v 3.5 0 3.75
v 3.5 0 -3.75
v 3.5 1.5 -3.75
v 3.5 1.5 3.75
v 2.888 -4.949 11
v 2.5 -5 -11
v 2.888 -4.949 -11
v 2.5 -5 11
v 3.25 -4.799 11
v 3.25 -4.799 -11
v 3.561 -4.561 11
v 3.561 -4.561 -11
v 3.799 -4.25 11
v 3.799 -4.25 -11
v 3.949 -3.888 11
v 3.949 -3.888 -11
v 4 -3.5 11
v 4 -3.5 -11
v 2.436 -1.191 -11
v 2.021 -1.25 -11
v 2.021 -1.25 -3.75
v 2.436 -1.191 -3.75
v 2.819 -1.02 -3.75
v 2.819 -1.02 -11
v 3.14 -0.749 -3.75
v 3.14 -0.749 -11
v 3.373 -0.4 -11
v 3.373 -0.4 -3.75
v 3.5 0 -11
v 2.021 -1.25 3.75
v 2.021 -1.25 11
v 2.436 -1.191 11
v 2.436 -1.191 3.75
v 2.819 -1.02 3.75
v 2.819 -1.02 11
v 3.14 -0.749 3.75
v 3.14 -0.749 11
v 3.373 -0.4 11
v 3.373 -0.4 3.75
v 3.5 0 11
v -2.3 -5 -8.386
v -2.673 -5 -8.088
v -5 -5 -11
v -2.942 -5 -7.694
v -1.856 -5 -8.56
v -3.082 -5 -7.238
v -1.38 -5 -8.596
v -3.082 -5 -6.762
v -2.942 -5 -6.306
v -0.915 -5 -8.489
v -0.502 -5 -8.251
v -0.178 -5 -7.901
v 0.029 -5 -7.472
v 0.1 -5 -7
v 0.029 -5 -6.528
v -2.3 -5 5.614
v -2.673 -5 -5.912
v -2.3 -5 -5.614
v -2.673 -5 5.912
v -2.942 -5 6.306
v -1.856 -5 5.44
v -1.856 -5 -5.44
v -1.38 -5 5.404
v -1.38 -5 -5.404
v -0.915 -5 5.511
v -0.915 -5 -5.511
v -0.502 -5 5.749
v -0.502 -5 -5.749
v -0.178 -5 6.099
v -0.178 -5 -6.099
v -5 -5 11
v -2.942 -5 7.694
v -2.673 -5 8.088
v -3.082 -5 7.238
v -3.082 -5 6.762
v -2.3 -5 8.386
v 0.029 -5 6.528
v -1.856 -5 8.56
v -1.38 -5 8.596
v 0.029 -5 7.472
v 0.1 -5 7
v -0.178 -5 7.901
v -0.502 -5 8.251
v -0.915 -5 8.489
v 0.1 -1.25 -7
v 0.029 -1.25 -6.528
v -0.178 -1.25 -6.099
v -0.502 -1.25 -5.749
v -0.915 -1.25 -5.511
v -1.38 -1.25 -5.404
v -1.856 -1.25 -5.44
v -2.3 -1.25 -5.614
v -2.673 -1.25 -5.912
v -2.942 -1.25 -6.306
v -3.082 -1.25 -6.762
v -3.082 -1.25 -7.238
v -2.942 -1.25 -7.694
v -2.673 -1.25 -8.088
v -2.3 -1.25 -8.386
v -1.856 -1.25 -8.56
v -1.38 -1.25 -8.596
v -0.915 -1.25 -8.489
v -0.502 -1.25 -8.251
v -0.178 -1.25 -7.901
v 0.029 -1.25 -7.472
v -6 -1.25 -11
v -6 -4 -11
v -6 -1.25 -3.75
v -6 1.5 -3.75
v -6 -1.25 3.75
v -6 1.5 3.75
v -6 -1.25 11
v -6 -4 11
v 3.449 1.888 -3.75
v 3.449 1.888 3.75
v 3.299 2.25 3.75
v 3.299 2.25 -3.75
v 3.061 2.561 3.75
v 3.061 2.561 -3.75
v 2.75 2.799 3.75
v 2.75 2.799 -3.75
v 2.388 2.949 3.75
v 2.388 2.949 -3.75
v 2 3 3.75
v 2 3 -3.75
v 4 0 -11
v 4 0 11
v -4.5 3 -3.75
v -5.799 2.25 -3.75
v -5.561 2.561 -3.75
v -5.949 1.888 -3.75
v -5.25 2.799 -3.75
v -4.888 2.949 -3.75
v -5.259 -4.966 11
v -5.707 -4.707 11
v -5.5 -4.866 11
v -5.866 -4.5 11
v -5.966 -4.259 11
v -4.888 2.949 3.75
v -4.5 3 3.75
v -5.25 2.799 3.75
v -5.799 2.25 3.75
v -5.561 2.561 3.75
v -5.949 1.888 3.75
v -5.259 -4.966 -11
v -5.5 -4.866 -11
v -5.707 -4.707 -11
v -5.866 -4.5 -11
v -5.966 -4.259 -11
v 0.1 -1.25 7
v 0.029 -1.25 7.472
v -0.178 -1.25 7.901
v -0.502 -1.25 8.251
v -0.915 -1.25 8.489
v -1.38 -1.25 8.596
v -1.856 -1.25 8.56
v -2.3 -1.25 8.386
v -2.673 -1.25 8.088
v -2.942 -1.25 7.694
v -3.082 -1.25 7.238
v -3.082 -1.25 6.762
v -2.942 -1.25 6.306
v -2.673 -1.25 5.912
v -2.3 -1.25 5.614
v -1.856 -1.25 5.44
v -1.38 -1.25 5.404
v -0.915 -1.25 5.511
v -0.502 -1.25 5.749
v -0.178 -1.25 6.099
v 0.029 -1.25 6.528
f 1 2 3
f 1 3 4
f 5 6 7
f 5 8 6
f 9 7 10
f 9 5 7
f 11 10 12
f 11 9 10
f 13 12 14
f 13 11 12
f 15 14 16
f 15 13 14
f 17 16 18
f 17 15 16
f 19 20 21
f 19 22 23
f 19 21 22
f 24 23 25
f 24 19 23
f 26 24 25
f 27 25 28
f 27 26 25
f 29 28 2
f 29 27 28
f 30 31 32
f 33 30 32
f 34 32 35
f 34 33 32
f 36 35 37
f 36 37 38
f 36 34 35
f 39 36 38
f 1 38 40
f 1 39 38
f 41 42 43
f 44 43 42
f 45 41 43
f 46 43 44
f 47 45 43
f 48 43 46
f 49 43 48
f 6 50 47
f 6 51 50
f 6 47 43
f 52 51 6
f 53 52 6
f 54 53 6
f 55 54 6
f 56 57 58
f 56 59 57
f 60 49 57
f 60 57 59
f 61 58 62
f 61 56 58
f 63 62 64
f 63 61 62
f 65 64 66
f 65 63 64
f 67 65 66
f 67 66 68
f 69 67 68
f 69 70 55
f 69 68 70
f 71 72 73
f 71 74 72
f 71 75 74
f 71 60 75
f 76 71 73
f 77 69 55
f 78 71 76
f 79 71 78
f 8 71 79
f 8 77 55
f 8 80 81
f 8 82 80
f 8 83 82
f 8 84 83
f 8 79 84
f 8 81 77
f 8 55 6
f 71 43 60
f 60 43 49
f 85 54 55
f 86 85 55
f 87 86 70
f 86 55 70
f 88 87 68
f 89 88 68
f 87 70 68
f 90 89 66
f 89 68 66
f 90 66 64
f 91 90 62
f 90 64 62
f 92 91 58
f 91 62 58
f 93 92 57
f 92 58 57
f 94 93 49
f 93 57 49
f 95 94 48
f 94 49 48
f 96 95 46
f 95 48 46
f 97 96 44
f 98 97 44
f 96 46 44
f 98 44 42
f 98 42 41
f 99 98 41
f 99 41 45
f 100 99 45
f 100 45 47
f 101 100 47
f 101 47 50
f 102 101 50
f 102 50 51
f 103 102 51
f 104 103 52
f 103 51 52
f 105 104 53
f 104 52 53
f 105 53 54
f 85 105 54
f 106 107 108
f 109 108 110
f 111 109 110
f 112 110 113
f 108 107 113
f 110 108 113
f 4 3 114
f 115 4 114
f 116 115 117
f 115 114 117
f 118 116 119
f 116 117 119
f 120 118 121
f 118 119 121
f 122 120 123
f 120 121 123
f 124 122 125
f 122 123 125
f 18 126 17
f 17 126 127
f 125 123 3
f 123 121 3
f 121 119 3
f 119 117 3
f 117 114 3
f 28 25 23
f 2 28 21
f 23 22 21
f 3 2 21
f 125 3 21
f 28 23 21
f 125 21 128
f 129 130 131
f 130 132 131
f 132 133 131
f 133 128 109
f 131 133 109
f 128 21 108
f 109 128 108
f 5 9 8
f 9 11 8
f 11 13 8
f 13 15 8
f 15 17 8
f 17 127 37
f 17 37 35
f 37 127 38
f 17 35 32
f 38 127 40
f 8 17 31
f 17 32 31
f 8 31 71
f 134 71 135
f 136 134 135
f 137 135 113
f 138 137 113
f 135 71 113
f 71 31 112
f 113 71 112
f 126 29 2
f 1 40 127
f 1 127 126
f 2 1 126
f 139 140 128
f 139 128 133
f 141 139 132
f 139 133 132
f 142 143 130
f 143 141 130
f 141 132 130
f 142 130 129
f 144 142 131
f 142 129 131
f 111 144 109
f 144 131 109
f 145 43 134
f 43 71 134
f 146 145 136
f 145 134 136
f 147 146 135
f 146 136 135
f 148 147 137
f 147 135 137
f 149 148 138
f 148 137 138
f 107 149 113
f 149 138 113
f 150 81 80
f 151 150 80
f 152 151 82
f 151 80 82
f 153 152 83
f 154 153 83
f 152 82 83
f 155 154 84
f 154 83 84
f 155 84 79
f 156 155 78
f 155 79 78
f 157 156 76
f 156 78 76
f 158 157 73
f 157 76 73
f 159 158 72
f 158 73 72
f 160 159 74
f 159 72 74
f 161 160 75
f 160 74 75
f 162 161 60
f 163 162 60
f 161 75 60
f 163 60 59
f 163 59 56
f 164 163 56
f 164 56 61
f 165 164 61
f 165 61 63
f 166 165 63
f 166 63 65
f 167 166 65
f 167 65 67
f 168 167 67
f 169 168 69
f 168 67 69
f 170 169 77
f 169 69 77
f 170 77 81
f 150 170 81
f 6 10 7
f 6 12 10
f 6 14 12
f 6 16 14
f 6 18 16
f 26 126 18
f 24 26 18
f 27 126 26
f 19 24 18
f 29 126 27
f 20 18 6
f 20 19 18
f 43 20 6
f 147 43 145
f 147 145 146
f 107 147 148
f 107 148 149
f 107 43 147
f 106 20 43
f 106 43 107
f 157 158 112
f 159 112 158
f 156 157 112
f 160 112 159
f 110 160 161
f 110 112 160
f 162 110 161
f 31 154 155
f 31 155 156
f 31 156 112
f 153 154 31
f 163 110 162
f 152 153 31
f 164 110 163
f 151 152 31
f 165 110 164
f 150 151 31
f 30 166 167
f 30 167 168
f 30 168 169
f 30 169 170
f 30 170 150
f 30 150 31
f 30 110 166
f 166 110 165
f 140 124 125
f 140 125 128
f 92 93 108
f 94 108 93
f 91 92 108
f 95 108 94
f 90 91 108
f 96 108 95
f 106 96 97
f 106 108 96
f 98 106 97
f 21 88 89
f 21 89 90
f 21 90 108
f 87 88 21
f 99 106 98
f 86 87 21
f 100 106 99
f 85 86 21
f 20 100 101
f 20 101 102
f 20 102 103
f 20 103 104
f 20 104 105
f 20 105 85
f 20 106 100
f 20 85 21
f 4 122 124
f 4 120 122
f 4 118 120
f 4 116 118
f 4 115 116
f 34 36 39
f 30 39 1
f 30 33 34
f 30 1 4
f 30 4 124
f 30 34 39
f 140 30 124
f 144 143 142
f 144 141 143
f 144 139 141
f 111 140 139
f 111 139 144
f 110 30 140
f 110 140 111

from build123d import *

# Parameters (mm, degrees)
F0_W        = 10
F0_H        = 22
F1_DEPTH    = 5
F2_W        = 9.5
F2_H        = 1.25
F3_DEPTH    = 22
F4_R        = 1.5
F5_R        = 1.6
F6_DEPTH    = 3.75
F7_W        = 9.5
F7_H        = 7.5
F8_DEPTH    = 4.25
F9_T1_DEPTH = 10.9475498644
F9_T3_DEPTH = 10.9475498644
F9_T5_DEPTH = 15
F9_T7_DEPTH = 15
F10_R       = 1


# Not quite as in the source:
# - a fillet or chamfer that OpenCascade refuses, or shapes differently, is made with other operations: its cross-section is extruded or revolved along the edge and cut away or added


with BuildPart() as f1:
    # F0 (on Front) → F1 (new body)
    with BuildSketch(Plane.XZ):
        with Locations((-1, 0)):
            Rectangle(F0_W, F0_H)
    extrude(amount=F1_DEPTH)

    # F2 (on face) → F3 (cut, through all)
    with BuildSketch(Plane(origin=(0, 0, -11), x_dir=(1, 0, 0), z_dir=(0, 0, -1))):
        with Locations((-1.25, 0.625)):
            Rectangle(F2_W, F2_H)
    extrude(amount=-F3_DEPTH, mode=Mode.SUBTRACT)

    # F4
    f4_edges = [f1.edges().sort_by_distance(p)[0] for p in [
        (4, -5, 0),
    ]]
    fillet(f4_edges, radius=F4_R)

    # F5 (on face) → F6 (cut, through all)
    with BuildSketch(Plane.XZ.offset(5)):
        with Locations((-1.5, 7)):
            Circle(F5_R)
        with Locations((-1.5, -7)):
            Circle(F5_R)
    extrude(amount=-F6_DEPTH, mode=Mode.SUBTRACT)

    # F7 (on face) → F8 (join)
    with BuildSketch(Plane(origin=(0, -1.25, 0), x_dir=(-1, 0, 0), z_dir=(0, 1, 0))):
        with Locations((1.25, 0)):
            Rectangle(F7_W, F7_H)
    extrude(amount=F8_DEPTH)

    # F9: fillet of radius 1.5 on 4 edges, made by hand

    # F9_s2 → F9_t1 (join)
    with BuildSketch(Plane.XY.offset(0.0524501356)):
        with BuildLine():
            ThreePointArc((2.0209800542, -1.25), (2.9892258908, -0.8956439237), (3.5, 0))
            Line((3.5, 0), (3.5, -1.25))
            Line((3.5, -1.25), (2.0209800542, -1.25))
        make_face()
    extrude(amount=F9_T1_DEPTH)

    # F9_s4 → F9_t3 (join)
    with BuildSketch(Plane.XY.offset(-11)):
        with BuildLine():
            ThreePointArc((2.0209800542, -1.25), (2.9892258908, -0.8956439237), (3.5, 0))
            Line((3.5, 0), (3.5, -1.25))
            Line((3.5, -1.25), (2.0209800542, -1.25))
        make_face()
    extrude(amount=F9_T3_DEPTH)

    # F9_s6 → F9_t5 (cut)
    with BuildSketch(Plane.XY.offset(-7.5)):
        with BuildLine():
            ThreePointArc((-4.5, 3), (-5.5606601718, 2.5606601718), (-6, 1.5))
            Line((-6, 1.5), (-6, 3))
            Line((-6, 3), (-4.5, 3))
        make_face()
    extrude(amount=F9_T5_DEPTH, mode=Mode.SUBTRACT)

    # F9_s8 → F9_t7 (cut)
    with BuildSketch(Plane.XY.offset(-7.5)):
        with BuildLine():
            ThreePointArc((3.5, 1.5), (3.0606601718, 2.5606601718), (2, 3))
            Line((2, 3), (3.5, 3))
            Line((3.5, 3), (3.5, 1.5))
        make_face()
    extrude(amount=F9_T7_DEPTH, mode=Mode.SUBTRACT)

    # F10
    f10_edges = [f1.edges().sort_by_distance(p)[0] for p in [
        (-6, -5, 0),
    ]]
    fillet(f10_edges, radius=F10_R)


solid = f1.part
